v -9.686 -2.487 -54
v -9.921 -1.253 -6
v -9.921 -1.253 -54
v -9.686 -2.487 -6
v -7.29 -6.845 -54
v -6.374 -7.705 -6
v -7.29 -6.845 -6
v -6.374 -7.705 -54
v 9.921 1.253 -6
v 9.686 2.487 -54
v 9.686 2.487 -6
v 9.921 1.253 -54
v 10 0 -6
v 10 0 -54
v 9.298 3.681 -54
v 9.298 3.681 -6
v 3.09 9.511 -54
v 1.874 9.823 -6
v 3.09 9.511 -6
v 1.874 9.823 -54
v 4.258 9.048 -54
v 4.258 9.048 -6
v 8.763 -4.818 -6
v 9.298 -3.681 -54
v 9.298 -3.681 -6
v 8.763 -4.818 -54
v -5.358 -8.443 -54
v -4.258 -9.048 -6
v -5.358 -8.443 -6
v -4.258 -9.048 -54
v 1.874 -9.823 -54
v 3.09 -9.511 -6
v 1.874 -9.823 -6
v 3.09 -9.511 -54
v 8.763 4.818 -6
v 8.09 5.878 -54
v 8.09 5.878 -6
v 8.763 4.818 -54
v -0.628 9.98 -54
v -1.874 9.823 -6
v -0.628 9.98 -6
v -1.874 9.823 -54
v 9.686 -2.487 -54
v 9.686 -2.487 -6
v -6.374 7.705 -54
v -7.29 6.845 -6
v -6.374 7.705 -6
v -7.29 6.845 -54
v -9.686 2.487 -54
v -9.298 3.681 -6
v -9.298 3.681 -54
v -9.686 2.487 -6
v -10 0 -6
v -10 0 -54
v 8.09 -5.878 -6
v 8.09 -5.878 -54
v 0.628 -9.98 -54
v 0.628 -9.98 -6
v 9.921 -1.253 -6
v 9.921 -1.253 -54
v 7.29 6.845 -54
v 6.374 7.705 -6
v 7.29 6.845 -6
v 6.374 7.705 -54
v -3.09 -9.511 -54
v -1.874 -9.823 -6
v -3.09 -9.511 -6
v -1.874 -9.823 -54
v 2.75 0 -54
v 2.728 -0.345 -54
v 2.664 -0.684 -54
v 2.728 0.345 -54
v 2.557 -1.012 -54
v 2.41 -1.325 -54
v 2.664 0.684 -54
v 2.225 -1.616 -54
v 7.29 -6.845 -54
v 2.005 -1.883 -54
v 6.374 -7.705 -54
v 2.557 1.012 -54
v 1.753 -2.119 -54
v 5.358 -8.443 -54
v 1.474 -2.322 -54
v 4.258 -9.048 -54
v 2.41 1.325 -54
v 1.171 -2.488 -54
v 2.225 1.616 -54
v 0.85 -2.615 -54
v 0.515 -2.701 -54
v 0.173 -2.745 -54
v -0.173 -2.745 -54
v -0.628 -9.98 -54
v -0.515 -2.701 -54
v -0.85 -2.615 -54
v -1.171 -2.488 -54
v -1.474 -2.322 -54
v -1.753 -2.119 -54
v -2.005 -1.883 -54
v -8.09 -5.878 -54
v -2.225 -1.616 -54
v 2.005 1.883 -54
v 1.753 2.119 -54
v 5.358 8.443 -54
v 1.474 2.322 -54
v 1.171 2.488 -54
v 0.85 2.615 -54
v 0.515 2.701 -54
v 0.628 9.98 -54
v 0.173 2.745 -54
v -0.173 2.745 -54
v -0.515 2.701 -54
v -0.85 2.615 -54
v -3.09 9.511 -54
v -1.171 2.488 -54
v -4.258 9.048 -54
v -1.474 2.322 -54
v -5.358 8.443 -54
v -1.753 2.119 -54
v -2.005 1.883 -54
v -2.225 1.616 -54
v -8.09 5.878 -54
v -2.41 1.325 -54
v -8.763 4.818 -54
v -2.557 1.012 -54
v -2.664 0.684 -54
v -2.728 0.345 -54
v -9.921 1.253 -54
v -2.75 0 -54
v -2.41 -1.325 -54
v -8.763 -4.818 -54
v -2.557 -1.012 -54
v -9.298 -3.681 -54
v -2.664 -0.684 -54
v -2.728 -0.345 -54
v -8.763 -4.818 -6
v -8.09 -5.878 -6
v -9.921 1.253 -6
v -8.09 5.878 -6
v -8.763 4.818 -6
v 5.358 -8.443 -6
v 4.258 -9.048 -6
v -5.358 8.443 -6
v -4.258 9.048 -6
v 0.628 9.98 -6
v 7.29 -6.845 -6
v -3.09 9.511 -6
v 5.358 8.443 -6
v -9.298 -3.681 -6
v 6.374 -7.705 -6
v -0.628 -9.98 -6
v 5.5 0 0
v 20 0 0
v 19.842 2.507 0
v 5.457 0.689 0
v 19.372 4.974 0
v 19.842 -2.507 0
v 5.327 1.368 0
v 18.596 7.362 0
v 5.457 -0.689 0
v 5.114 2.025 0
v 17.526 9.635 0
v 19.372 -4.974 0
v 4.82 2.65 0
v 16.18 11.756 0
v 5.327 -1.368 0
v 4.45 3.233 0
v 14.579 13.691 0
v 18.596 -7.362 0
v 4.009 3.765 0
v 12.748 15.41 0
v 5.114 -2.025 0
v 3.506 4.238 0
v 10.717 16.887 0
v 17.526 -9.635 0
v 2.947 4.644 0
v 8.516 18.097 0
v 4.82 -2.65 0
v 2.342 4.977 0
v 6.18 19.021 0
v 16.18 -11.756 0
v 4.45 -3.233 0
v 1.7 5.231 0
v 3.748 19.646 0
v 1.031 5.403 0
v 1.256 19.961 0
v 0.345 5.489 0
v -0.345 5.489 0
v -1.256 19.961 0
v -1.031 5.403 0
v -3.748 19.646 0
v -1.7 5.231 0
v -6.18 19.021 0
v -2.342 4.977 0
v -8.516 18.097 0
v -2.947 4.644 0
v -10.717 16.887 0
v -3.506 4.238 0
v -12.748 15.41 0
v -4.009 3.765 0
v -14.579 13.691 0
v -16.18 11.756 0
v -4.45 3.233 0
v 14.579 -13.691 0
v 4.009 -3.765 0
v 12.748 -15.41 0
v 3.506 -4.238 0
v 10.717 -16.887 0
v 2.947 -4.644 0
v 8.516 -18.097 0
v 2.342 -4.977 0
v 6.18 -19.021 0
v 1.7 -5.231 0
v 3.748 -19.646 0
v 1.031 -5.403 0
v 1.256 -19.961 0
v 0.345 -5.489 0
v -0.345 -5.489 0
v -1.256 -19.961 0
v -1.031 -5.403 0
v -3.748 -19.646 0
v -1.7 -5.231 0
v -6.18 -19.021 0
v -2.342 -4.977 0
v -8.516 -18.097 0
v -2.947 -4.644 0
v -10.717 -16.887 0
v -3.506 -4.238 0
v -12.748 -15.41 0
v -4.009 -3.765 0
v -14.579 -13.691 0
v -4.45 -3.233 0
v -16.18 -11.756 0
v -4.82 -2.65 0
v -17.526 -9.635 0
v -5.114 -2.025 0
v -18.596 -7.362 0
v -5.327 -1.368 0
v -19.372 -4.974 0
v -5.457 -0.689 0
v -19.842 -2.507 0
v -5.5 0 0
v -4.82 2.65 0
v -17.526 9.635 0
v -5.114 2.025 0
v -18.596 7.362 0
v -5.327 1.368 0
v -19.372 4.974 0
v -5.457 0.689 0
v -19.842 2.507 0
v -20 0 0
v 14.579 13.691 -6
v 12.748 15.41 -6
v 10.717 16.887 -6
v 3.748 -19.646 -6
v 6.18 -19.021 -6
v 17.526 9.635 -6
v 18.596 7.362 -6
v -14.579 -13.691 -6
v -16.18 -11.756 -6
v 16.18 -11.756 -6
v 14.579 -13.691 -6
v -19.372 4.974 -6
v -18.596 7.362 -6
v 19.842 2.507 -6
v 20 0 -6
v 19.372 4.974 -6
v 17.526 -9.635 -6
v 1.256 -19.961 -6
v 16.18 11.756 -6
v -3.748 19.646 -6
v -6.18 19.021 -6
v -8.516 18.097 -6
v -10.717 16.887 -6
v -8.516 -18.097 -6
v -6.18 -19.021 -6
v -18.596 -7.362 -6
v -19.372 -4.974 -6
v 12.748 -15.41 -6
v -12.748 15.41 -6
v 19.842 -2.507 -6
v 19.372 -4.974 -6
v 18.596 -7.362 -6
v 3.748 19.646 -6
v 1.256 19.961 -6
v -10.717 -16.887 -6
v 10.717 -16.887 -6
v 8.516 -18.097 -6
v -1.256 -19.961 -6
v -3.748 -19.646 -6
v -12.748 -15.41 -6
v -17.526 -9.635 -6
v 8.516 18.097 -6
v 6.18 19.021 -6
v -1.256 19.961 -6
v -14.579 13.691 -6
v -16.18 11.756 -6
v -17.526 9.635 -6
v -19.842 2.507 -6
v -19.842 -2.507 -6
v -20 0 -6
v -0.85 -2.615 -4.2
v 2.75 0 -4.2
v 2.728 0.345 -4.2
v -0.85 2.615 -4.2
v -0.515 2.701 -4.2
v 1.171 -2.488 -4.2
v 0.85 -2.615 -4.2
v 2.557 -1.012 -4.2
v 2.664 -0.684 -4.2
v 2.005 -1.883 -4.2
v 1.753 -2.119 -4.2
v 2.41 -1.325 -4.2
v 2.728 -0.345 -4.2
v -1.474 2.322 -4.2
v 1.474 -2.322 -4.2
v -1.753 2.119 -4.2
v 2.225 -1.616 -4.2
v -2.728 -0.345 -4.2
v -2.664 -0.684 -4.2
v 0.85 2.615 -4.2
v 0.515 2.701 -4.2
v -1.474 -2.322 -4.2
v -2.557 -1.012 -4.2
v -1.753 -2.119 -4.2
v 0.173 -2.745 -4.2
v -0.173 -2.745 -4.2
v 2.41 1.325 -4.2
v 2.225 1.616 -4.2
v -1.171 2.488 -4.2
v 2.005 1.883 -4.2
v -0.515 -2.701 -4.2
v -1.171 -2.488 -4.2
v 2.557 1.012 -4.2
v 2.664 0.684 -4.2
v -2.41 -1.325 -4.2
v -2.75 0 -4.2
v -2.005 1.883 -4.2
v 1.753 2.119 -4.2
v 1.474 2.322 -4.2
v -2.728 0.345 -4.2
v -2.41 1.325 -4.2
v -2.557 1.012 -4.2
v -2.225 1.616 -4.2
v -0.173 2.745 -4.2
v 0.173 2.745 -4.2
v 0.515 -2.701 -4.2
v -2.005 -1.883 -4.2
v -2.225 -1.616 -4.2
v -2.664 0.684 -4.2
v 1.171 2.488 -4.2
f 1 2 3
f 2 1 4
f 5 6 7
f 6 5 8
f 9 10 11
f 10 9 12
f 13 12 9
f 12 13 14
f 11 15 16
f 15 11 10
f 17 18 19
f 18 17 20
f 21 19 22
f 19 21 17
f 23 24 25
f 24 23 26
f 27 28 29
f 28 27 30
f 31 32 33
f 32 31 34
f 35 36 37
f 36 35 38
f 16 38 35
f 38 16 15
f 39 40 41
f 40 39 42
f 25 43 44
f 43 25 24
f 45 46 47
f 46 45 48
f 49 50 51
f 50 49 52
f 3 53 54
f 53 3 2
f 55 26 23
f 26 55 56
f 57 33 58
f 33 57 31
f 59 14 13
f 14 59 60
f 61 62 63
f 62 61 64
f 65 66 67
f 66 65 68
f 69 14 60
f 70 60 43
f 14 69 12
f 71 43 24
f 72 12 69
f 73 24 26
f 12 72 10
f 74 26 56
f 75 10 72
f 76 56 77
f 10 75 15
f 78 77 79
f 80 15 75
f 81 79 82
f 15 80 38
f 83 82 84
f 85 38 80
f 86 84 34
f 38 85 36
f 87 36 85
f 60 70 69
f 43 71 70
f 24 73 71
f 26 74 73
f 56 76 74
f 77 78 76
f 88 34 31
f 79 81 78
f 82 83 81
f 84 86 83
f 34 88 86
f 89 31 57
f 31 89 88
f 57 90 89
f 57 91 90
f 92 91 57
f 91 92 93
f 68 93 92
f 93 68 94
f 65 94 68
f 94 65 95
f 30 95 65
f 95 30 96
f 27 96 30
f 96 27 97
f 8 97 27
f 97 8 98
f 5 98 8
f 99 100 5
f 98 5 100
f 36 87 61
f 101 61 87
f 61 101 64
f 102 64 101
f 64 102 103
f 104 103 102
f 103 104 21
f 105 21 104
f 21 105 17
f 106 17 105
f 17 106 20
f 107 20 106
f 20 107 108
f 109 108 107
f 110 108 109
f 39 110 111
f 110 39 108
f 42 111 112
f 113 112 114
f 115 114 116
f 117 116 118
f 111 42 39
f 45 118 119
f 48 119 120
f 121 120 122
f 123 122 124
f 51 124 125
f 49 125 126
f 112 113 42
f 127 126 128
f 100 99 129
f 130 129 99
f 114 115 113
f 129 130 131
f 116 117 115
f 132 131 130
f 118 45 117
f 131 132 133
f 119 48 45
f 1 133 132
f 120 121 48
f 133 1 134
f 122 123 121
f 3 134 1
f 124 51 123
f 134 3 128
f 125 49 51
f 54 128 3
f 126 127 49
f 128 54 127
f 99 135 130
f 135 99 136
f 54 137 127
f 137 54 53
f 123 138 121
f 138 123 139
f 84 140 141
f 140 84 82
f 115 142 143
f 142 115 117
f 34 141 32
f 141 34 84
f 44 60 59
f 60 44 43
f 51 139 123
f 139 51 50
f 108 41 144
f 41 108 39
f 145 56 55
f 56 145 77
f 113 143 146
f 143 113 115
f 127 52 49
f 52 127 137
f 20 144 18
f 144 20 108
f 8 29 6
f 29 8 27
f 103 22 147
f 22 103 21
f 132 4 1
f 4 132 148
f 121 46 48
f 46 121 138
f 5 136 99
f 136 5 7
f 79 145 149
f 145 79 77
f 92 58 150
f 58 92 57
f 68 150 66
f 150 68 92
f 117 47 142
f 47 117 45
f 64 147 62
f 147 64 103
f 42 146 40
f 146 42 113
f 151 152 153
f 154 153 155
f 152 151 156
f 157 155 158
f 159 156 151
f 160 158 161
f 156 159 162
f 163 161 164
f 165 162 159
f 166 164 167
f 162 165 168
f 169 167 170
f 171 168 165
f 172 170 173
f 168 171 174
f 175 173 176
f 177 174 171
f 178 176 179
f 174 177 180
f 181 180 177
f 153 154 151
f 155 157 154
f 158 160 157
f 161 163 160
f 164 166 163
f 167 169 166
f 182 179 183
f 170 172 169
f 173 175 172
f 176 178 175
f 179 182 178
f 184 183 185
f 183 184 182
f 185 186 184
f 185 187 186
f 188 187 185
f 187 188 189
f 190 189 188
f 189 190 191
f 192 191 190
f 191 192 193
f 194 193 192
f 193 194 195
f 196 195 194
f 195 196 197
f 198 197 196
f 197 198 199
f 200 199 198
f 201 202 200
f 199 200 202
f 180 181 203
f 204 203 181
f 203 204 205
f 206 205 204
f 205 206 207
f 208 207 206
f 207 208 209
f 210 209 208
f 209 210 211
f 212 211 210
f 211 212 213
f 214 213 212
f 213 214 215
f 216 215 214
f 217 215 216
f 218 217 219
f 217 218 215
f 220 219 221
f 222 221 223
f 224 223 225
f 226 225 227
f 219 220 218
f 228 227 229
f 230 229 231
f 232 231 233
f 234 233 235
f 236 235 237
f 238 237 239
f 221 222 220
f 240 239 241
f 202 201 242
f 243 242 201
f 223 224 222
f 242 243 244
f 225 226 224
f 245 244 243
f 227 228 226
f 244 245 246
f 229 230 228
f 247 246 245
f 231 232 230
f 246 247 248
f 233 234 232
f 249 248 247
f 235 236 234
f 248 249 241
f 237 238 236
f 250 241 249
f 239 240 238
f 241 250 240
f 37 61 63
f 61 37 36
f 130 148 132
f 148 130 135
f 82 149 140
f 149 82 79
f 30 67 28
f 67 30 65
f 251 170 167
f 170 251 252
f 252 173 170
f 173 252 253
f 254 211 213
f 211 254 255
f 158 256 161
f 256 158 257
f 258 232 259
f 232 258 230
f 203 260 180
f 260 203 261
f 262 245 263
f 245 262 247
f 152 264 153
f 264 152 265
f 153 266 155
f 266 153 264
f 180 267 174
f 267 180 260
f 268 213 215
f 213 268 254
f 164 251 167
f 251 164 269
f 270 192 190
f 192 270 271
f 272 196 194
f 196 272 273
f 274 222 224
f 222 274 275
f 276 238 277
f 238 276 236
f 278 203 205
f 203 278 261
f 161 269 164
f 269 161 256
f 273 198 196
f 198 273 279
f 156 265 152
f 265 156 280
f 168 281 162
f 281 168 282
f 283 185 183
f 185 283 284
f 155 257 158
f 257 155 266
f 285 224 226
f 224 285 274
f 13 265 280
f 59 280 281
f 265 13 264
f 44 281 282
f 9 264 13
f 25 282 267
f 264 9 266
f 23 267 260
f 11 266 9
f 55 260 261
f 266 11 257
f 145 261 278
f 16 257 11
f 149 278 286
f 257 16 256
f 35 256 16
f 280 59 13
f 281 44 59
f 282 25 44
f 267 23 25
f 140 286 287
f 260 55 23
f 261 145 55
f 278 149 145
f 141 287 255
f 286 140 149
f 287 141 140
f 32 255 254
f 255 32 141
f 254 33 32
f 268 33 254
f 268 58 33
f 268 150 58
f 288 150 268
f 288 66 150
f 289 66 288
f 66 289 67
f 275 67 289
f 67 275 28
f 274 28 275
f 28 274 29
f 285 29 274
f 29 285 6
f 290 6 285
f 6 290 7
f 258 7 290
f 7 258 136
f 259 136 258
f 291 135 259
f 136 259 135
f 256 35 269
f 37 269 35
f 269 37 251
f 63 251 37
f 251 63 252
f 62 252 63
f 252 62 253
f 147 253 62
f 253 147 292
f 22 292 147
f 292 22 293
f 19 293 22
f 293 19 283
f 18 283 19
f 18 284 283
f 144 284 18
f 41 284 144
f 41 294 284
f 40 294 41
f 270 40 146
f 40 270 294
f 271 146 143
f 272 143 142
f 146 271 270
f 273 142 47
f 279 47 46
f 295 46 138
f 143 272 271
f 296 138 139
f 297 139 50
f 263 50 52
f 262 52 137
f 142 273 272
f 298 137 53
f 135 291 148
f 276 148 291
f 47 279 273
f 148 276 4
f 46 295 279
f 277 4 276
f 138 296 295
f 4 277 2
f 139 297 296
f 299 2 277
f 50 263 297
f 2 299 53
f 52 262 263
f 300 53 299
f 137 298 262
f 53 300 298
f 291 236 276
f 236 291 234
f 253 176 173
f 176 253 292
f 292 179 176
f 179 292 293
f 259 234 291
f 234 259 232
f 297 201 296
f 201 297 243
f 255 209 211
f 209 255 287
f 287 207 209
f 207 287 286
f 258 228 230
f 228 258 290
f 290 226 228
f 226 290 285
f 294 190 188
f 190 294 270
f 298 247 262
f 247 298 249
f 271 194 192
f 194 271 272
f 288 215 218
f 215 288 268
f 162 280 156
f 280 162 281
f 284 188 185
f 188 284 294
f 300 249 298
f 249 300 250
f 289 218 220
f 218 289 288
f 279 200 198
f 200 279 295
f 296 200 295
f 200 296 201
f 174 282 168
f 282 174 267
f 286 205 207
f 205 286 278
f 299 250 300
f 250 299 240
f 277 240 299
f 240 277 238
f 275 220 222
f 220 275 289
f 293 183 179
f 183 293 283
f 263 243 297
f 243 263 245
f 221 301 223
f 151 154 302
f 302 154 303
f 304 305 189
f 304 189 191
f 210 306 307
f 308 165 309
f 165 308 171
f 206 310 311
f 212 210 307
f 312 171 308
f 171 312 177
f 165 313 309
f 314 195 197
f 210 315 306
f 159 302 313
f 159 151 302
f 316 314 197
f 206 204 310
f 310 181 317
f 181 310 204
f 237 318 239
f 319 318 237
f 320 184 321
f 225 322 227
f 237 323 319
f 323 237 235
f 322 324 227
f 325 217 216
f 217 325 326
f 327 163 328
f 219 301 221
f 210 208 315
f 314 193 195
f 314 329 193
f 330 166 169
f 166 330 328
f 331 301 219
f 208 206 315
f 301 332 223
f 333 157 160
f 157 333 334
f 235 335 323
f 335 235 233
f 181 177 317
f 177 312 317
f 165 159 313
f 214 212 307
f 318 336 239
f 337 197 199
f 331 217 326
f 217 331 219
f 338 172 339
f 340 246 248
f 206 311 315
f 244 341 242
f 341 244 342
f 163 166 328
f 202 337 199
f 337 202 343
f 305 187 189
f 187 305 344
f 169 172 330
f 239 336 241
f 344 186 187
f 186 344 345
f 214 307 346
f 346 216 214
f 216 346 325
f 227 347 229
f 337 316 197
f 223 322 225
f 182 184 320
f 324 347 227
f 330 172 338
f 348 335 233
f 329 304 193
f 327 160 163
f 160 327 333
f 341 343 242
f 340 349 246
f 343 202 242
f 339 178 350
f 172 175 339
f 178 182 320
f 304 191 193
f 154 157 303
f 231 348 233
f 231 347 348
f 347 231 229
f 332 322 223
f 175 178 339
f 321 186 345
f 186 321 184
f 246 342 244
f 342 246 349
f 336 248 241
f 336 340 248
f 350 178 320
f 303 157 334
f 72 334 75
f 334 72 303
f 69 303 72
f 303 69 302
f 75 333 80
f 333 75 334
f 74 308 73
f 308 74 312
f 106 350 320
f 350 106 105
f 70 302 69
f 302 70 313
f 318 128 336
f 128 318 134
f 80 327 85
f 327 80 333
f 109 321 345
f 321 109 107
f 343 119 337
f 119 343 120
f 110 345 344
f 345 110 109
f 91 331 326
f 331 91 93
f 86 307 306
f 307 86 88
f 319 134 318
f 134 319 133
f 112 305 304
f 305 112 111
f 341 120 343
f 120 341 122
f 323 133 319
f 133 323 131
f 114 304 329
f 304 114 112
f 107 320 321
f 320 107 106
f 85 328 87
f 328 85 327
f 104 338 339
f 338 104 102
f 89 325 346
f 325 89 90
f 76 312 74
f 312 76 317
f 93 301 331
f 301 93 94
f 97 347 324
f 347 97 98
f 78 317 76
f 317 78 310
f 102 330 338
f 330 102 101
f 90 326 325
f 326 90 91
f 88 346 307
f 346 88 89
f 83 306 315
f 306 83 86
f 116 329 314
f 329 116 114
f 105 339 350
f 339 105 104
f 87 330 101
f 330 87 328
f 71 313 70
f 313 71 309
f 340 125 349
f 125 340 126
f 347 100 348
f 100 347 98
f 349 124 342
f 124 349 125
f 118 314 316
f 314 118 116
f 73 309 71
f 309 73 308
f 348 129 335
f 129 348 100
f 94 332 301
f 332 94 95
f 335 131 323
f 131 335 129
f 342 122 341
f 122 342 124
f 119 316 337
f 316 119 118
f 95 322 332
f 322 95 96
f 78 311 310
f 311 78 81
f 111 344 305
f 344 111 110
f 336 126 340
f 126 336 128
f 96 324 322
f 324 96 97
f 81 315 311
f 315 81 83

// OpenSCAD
$fn = 50;


difference() {
	union() {
		translate(v = [0, 0, -54.0000000000]) {
			cylinder(h = 54, r = 10.0000000000);
		}
		translate(v = [0, 0, -6.0000000000]) {
			cylinder(h = 6, r = 20.0000000000);
		}
	}
	union() {
		translate(v = [0, 0, 0]) {
			rotate(a = [0, 0, 0]) {
				difference() {
					union() {
						#translate(v = [0, 0, -54.0000000000]) {
							cylinder(h = 54, r = 2.2500000000);
						}
						#translate(v = [0, 0, -4.2000000000]) {
							cylinder(h = 4.2000000000, r1 = 2.7500000000, r2 = 5.5000000000);
						}
						#translate(v = [0, 0, -54.0000000000]) {
							cylinder(h = 54, r = 2.7500000000);
						}
						#translate(v = [0, 0, -54.0000000000]) {
							cylinder(h = 54, r = 2.2500000000);
						}
					}
					union();
				}
			}
		}
	}
}
